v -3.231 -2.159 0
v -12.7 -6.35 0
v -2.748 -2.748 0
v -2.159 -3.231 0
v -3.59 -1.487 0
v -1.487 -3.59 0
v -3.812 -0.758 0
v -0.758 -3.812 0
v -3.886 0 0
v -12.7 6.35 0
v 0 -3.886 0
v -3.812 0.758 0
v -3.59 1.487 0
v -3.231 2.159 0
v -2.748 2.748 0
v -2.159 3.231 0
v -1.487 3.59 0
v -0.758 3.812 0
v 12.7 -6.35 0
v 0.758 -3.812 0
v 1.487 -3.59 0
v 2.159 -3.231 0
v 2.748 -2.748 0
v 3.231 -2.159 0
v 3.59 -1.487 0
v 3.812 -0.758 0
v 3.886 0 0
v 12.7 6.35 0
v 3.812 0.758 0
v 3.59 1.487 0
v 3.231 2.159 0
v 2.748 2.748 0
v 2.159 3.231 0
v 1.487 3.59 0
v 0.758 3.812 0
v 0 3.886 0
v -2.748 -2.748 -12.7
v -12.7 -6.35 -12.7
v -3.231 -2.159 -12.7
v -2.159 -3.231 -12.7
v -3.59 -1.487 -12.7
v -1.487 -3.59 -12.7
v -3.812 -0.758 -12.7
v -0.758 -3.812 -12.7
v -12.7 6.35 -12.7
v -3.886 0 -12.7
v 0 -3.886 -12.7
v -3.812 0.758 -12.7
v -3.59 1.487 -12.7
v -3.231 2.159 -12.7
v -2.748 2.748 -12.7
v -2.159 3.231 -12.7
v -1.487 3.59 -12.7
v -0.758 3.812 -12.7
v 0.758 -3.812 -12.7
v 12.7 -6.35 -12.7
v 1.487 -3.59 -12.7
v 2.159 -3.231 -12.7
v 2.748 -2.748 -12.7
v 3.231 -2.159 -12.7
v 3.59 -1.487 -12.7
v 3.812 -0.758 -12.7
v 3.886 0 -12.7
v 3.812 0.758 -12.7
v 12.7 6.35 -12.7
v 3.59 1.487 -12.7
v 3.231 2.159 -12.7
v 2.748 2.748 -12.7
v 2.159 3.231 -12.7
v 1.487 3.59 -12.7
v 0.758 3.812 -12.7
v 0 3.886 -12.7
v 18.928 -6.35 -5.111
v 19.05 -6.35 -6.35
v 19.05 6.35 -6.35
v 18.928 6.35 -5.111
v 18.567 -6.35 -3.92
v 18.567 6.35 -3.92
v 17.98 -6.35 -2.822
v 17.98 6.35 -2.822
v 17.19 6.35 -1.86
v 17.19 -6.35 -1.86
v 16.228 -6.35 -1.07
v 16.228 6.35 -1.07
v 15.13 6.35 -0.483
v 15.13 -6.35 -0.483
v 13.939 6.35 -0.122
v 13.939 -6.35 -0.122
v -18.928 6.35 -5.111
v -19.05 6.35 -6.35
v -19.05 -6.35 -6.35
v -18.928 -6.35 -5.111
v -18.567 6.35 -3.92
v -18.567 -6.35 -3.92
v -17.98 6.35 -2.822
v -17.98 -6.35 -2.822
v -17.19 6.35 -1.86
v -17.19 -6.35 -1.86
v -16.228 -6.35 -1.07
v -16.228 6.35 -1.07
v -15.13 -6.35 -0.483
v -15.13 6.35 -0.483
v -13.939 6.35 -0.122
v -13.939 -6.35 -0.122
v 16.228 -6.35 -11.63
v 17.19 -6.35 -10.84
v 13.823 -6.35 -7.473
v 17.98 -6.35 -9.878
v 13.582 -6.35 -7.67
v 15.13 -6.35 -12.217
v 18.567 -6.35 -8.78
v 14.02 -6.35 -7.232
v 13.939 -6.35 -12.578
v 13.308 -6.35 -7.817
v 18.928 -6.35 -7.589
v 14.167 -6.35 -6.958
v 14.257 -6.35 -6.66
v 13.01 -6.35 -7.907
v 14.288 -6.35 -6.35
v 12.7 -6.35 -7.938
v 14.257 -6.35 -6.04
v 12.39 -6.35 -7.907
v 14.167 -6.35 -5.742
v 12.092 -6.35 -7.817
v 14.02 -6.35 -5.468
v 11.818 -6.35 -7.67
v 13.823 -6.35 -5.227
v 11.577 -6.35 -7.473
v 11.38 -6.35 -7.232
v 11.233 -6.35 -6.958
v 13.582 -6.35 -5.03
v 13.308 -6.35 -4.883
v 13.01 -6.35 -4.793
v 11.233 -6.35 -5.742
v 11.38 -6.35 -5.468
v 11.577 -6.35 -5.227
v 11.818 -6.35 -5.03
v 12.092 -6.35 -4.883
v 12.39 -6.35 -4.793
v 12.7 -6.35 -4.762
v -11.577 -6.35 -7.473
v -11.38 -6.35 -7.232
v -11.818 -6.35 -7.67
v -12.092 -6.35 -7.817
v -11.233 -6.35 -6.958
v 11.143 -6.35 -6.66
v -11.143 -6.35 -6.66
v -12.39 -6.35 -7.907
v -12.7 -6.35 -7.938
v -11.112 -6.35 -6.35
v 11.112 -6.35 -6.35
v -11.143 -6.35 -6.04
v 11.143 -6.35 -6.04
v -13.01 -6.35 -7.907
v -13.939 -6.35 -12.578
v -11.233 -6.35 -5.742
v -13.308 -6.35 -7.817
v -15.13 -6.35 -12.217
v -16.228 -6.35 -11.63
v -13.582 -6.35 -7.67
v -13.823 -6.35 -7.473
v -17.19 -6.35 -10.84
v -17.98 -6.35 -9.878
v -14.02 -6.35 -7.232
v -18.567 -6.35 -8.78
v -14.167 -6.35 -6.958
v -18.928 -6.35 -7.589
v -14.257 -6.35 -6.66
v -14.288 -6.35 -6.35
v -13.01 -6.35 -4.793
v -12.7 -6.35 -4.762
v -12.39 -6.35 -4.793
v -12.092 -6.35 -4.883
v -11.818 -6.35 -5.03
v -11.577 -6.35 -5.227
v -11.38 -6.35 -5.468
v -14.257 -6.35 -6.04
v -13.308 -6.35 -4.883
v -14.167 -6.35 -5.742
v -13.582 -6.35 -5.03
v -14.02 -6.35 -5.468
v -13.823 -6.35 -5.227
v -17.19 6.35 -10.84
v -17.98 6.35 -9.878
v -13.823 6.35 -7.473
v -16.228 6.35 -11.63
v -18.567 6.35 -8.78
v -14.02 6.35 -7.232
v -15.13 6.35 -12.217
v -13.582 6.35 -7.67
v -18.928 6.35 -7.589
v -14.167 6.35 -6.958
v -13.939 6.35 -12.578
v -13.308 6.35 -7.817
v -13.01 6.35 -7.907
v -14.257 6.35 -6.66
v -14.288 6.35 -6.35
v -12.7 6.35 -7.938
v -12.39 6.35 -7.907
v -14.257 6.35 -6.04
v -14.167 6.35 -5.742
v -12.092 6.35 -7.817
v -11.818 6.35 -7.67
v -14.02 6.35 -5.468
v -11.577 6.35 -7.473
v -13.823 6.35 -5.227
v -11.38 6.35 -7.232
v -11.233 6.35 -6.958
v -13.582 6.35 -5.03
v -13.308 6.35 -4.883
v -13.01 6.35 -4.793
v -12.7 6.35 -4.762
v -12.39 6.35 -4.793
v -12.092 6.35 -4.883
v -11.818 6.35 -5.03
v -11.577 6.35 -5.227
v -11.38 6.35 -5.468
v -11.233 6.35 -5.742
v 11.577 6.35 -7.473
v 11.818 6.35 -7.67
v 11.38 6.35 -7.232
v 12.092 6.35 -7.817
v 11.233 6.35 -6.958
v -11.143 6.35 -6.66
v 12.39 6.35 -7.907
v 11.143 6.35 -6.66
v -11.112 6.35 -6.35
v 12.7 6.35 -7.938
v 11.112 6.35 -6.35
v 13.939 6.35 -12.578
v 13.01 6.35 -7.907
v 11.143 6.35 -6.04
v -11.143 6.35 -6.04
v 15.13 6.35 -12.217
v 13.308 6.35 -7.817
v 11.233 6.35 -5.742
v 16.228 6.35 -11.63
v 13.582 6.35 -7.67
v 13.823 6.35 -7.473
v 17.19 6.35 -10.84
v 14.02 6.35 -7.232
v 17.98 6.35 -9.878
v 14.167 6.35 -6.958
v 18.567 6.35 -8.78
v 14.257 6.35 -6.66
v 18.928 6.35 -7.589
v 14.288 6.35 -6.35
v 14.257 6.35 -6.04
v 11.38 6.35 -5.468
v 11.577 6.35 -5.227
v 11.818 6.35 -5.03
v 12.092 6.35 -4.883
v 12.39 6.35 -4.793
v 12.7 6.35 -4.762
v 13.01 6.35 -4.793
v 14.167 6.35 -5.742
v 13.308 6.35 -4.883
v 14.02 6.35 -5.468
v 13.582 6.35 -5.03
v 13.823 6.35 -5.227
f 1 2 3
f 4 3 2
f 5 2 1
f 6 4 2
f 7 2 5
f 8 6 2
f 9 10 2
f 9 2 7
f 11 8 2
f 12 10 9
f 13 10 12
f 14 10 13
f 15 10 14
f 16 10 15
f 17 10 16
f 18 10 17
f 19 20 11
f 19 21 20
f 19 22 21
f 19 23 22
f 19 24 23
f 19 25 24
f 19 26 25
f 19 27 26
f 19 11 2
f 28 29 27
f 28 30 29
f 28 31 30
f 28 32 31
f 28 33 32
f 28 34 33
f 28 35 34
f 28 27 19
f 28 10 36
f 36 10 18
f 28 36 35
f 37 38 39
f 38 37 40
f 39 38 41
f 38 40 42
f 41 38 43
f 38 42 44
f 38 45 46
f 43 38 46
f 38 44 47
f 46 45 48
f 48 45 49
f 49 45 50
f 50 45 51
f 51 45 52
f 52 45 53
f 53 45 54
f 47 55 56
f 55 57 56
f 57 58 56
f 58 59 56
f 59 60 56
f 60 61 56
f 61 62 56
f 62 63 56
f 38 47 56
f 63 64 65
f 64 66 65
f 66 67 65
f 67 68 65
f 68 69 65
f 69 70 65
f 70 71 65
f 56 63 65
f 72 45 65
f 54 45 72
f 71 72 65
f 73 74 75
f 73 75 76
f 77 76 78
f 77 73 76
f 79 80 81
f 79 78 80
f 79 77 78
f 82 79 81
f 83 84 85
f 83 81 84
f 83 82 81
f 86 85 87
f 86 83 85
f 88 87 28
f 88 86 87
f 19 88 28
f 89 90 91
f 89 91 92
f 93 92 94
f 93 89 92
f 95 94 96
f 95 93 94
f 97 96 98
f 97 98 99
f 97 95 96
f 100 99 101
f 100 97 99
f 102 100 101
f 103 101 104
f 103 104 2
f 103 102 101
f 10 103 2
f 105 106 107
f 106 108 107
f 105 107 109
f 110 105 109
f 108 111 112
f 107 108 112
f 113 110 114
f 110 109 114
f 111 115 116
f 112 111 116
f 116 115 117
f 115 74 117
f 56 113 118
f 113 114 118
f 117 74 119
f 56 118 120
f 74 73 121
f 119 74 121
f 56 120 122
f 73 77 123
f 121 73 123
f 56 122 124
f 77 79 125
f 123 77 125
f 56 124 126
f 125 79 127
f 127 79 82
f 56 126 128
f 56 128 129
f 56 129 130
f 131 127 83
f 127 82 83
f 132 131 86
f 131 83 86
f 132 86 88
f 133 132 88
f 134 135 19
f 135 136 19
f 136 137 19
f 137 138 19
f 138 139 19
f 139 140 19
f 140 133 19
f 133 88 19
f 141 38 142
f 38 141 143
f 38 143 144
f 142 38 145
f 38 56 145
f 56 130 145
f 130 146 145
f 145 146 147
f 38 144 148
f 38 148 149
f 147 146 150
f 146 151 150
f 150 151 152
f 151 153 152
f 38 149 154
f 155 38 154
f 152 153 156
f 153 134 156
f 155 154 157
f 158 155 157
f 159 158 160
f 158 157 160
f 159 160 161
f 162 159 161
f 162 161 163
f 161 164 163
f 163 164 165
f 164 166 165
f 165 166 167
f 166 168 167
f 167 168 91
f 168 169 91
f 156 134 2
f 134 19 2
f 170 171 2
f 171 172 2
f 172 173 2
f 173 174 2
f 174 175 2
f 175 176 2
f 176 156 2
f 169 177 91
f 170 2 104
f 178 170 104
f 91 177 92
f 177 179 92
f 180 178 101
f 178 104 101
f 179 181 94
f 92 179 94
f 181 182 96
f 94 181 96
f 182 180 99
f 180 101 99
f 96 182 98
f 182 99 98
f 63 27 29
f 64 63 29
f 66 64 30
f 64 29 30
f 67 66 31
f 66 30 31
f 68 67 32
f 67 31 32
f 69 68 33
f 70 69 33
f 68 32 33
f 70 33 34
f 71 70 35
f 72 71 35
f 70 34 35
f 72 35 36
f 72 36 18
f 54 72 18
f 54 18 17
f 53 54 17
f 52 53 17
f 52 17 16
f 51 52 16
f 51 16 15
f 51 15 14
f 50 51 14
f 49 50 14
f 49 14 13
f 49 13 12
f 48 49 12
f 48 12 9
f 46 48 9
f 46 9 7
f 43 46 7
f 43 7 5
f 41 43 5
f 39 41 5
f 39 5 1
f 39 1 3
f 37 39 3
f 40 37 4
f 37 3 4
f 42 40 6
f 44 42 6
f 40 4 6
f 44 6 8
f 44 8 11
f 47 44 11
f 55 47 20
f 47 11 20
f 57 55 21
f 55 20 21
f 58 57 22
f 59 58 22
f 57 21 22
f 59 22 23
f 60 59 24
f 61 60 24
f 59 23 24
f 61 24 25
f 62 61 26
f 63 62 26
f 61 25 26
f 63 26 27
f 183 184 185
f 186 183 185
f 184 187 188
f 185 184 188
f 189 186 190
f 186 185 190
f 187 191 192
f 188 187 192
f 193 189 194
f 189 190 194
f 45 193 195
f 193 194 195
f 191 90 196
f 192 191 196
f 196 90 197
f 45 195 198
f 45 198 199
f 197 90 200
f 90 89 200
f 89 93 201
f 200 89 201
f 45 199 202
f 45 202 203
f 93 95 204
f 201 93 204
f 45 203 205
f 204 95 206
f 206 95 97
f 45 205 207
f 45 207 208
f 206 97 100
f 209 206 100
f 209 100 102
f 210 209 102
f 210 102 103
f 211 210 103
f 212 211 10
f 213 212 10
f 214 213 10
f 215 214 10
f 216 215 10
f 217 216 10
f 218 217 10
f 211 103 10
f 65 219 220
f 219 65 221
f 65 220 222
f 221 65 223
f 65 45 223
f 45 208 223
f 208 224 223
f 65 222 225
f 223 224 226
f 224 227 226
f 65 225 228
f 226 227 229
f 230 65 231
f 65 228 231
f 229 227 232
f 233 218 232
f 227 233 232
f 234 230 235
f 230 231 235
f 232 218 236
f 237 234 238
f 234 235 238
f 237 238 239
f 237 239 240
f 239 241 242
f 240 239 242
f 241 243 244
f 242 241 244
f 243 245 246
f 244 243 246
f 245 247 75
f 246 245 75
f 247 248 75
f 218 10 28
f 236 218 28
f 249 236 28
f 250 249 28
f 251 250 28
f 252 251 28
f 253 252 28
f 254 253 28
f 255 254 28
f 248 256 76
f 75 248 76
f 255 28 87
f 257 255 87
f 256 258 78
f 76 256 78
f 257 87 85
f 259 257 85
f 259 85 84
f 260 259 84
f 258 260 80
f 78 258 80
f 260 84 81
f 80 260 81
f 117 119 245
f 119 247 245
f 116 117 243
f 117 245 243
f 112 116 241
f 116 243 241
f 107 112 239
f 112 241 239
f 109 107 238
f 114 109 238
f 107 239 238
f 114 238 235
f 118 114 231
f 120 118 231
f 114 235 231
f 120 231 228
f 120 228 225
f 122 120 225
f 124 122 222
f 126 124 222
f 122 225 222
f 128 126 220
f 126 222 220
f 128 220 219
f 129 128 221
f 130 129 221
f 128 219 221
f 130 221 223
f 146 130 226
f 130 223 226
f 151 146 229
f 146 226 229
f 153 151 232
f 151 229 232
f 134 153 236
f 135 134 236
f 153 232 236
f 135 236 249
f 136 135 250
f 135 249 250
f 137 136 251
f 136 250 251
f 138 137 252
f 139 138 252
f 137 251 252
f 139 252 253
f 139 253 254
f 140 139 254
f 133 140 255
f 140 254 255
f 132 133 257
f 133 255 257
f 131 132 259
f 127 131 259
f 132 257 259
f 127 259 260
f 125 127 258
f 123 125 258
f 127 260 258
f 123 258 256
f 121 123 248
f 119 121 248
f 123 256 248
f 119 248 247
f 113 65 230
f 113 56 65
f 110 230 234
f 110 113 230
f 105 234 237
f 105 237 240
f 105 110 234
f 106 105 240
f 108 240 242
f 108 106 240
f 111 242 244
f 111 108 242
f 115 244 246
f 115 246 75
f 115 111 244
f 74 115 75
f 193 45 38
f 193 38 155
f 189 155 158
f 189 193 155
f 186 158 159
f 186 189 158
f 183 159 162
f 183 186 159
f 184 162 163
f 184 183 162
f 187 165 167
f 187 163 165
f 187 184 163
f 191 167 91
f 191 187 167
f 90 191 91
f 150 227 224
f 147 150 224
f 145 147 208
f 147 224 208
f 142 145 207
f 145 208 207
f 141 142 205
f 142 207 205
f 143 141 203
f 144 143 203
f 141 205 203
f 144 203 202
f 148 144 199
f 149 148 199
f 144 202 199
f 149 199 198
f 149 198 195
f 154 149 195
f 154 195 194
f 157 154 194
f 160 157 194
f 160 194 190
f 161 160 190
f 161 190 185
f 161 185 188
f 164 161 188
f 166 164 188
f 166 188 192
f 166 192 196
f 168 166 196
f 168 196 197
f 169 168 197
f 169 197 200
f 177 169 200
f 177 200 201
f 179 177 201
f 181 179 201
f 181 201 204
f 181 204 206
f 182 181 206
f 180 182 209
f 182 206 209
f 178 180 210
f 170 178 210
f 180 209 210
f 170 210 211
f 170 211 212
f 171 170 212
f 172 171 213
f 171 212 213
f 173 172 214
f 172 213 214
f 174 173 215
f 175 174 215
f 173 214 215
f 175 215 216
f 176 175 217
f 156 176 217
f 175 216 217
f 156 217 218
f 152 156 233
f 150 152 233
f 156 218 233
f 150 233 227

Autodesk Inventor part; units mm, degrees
ref_plane "YZ Plane" through (0, 0, 0) normal (1, 0, 0) x (0, 1, 0)
ref_plane "XZ Plane" through (0, 0, 0) normal (0, 1, 0) x (-1, 0, 0)
ref_plane "XY Plane" through (0, 0, 0) normal (0, 0, 1) x (1, 0, 0)
sketch "Sketch1" plane through (0, 0, 0) normal (0, 0, 1) x (1, 0, 0)
  circle A0 centre (0, 0) radius 3.8862 projected
  line L0 (-19.05, 6.35) -> (19.05, 6.35)
  line L1 (19.05, 6.35) -> (19.05, -6.35)
  line L2 (19.05, -6.35) -> (-19.05, -6.35)
  line L3 (-19.05, -6.35) -> (-19.05, 6.35)
  point P0 (0, 0)
  dimension "d0" = 38.1
  dimension "d2" = 12.7
  dimension "d3" = 6.35
  dimension "d4" = 19.05
extrude "Extrusion1" add sketch "Sketch1" against normal blind 12.7
sketch "Sketch2" plane through (-19.05, 6.35, 0) normal (0, 1, 0) x (1, 0, 0)
  line L0 (38.1, 0) -> (38.1, 12.7) projected
  line L1 (0, 0) -> (0, 12.7) projected
  circle A0 centre (6.35, 6.35) radius 1.5875
  circle A1 centre (31.75, 6.35) radius 1.5875
  point P0 (19.05, 0)
  dimension "d7" = 3.175
  dimension "d9" = 6.35
  dimension "d10" = 6.35
extrude "Extrusion2" cut sketch "Sketch2" against normal up to next
fillet "Fillet1" radius 6.35 4 edges at (19.05, 0, -12.7) (19.05, 0, 0) (-19.05, 0, -12.7) (-19.05, 0, 0)
properties part number "motormount" material "ABS Plastic"
